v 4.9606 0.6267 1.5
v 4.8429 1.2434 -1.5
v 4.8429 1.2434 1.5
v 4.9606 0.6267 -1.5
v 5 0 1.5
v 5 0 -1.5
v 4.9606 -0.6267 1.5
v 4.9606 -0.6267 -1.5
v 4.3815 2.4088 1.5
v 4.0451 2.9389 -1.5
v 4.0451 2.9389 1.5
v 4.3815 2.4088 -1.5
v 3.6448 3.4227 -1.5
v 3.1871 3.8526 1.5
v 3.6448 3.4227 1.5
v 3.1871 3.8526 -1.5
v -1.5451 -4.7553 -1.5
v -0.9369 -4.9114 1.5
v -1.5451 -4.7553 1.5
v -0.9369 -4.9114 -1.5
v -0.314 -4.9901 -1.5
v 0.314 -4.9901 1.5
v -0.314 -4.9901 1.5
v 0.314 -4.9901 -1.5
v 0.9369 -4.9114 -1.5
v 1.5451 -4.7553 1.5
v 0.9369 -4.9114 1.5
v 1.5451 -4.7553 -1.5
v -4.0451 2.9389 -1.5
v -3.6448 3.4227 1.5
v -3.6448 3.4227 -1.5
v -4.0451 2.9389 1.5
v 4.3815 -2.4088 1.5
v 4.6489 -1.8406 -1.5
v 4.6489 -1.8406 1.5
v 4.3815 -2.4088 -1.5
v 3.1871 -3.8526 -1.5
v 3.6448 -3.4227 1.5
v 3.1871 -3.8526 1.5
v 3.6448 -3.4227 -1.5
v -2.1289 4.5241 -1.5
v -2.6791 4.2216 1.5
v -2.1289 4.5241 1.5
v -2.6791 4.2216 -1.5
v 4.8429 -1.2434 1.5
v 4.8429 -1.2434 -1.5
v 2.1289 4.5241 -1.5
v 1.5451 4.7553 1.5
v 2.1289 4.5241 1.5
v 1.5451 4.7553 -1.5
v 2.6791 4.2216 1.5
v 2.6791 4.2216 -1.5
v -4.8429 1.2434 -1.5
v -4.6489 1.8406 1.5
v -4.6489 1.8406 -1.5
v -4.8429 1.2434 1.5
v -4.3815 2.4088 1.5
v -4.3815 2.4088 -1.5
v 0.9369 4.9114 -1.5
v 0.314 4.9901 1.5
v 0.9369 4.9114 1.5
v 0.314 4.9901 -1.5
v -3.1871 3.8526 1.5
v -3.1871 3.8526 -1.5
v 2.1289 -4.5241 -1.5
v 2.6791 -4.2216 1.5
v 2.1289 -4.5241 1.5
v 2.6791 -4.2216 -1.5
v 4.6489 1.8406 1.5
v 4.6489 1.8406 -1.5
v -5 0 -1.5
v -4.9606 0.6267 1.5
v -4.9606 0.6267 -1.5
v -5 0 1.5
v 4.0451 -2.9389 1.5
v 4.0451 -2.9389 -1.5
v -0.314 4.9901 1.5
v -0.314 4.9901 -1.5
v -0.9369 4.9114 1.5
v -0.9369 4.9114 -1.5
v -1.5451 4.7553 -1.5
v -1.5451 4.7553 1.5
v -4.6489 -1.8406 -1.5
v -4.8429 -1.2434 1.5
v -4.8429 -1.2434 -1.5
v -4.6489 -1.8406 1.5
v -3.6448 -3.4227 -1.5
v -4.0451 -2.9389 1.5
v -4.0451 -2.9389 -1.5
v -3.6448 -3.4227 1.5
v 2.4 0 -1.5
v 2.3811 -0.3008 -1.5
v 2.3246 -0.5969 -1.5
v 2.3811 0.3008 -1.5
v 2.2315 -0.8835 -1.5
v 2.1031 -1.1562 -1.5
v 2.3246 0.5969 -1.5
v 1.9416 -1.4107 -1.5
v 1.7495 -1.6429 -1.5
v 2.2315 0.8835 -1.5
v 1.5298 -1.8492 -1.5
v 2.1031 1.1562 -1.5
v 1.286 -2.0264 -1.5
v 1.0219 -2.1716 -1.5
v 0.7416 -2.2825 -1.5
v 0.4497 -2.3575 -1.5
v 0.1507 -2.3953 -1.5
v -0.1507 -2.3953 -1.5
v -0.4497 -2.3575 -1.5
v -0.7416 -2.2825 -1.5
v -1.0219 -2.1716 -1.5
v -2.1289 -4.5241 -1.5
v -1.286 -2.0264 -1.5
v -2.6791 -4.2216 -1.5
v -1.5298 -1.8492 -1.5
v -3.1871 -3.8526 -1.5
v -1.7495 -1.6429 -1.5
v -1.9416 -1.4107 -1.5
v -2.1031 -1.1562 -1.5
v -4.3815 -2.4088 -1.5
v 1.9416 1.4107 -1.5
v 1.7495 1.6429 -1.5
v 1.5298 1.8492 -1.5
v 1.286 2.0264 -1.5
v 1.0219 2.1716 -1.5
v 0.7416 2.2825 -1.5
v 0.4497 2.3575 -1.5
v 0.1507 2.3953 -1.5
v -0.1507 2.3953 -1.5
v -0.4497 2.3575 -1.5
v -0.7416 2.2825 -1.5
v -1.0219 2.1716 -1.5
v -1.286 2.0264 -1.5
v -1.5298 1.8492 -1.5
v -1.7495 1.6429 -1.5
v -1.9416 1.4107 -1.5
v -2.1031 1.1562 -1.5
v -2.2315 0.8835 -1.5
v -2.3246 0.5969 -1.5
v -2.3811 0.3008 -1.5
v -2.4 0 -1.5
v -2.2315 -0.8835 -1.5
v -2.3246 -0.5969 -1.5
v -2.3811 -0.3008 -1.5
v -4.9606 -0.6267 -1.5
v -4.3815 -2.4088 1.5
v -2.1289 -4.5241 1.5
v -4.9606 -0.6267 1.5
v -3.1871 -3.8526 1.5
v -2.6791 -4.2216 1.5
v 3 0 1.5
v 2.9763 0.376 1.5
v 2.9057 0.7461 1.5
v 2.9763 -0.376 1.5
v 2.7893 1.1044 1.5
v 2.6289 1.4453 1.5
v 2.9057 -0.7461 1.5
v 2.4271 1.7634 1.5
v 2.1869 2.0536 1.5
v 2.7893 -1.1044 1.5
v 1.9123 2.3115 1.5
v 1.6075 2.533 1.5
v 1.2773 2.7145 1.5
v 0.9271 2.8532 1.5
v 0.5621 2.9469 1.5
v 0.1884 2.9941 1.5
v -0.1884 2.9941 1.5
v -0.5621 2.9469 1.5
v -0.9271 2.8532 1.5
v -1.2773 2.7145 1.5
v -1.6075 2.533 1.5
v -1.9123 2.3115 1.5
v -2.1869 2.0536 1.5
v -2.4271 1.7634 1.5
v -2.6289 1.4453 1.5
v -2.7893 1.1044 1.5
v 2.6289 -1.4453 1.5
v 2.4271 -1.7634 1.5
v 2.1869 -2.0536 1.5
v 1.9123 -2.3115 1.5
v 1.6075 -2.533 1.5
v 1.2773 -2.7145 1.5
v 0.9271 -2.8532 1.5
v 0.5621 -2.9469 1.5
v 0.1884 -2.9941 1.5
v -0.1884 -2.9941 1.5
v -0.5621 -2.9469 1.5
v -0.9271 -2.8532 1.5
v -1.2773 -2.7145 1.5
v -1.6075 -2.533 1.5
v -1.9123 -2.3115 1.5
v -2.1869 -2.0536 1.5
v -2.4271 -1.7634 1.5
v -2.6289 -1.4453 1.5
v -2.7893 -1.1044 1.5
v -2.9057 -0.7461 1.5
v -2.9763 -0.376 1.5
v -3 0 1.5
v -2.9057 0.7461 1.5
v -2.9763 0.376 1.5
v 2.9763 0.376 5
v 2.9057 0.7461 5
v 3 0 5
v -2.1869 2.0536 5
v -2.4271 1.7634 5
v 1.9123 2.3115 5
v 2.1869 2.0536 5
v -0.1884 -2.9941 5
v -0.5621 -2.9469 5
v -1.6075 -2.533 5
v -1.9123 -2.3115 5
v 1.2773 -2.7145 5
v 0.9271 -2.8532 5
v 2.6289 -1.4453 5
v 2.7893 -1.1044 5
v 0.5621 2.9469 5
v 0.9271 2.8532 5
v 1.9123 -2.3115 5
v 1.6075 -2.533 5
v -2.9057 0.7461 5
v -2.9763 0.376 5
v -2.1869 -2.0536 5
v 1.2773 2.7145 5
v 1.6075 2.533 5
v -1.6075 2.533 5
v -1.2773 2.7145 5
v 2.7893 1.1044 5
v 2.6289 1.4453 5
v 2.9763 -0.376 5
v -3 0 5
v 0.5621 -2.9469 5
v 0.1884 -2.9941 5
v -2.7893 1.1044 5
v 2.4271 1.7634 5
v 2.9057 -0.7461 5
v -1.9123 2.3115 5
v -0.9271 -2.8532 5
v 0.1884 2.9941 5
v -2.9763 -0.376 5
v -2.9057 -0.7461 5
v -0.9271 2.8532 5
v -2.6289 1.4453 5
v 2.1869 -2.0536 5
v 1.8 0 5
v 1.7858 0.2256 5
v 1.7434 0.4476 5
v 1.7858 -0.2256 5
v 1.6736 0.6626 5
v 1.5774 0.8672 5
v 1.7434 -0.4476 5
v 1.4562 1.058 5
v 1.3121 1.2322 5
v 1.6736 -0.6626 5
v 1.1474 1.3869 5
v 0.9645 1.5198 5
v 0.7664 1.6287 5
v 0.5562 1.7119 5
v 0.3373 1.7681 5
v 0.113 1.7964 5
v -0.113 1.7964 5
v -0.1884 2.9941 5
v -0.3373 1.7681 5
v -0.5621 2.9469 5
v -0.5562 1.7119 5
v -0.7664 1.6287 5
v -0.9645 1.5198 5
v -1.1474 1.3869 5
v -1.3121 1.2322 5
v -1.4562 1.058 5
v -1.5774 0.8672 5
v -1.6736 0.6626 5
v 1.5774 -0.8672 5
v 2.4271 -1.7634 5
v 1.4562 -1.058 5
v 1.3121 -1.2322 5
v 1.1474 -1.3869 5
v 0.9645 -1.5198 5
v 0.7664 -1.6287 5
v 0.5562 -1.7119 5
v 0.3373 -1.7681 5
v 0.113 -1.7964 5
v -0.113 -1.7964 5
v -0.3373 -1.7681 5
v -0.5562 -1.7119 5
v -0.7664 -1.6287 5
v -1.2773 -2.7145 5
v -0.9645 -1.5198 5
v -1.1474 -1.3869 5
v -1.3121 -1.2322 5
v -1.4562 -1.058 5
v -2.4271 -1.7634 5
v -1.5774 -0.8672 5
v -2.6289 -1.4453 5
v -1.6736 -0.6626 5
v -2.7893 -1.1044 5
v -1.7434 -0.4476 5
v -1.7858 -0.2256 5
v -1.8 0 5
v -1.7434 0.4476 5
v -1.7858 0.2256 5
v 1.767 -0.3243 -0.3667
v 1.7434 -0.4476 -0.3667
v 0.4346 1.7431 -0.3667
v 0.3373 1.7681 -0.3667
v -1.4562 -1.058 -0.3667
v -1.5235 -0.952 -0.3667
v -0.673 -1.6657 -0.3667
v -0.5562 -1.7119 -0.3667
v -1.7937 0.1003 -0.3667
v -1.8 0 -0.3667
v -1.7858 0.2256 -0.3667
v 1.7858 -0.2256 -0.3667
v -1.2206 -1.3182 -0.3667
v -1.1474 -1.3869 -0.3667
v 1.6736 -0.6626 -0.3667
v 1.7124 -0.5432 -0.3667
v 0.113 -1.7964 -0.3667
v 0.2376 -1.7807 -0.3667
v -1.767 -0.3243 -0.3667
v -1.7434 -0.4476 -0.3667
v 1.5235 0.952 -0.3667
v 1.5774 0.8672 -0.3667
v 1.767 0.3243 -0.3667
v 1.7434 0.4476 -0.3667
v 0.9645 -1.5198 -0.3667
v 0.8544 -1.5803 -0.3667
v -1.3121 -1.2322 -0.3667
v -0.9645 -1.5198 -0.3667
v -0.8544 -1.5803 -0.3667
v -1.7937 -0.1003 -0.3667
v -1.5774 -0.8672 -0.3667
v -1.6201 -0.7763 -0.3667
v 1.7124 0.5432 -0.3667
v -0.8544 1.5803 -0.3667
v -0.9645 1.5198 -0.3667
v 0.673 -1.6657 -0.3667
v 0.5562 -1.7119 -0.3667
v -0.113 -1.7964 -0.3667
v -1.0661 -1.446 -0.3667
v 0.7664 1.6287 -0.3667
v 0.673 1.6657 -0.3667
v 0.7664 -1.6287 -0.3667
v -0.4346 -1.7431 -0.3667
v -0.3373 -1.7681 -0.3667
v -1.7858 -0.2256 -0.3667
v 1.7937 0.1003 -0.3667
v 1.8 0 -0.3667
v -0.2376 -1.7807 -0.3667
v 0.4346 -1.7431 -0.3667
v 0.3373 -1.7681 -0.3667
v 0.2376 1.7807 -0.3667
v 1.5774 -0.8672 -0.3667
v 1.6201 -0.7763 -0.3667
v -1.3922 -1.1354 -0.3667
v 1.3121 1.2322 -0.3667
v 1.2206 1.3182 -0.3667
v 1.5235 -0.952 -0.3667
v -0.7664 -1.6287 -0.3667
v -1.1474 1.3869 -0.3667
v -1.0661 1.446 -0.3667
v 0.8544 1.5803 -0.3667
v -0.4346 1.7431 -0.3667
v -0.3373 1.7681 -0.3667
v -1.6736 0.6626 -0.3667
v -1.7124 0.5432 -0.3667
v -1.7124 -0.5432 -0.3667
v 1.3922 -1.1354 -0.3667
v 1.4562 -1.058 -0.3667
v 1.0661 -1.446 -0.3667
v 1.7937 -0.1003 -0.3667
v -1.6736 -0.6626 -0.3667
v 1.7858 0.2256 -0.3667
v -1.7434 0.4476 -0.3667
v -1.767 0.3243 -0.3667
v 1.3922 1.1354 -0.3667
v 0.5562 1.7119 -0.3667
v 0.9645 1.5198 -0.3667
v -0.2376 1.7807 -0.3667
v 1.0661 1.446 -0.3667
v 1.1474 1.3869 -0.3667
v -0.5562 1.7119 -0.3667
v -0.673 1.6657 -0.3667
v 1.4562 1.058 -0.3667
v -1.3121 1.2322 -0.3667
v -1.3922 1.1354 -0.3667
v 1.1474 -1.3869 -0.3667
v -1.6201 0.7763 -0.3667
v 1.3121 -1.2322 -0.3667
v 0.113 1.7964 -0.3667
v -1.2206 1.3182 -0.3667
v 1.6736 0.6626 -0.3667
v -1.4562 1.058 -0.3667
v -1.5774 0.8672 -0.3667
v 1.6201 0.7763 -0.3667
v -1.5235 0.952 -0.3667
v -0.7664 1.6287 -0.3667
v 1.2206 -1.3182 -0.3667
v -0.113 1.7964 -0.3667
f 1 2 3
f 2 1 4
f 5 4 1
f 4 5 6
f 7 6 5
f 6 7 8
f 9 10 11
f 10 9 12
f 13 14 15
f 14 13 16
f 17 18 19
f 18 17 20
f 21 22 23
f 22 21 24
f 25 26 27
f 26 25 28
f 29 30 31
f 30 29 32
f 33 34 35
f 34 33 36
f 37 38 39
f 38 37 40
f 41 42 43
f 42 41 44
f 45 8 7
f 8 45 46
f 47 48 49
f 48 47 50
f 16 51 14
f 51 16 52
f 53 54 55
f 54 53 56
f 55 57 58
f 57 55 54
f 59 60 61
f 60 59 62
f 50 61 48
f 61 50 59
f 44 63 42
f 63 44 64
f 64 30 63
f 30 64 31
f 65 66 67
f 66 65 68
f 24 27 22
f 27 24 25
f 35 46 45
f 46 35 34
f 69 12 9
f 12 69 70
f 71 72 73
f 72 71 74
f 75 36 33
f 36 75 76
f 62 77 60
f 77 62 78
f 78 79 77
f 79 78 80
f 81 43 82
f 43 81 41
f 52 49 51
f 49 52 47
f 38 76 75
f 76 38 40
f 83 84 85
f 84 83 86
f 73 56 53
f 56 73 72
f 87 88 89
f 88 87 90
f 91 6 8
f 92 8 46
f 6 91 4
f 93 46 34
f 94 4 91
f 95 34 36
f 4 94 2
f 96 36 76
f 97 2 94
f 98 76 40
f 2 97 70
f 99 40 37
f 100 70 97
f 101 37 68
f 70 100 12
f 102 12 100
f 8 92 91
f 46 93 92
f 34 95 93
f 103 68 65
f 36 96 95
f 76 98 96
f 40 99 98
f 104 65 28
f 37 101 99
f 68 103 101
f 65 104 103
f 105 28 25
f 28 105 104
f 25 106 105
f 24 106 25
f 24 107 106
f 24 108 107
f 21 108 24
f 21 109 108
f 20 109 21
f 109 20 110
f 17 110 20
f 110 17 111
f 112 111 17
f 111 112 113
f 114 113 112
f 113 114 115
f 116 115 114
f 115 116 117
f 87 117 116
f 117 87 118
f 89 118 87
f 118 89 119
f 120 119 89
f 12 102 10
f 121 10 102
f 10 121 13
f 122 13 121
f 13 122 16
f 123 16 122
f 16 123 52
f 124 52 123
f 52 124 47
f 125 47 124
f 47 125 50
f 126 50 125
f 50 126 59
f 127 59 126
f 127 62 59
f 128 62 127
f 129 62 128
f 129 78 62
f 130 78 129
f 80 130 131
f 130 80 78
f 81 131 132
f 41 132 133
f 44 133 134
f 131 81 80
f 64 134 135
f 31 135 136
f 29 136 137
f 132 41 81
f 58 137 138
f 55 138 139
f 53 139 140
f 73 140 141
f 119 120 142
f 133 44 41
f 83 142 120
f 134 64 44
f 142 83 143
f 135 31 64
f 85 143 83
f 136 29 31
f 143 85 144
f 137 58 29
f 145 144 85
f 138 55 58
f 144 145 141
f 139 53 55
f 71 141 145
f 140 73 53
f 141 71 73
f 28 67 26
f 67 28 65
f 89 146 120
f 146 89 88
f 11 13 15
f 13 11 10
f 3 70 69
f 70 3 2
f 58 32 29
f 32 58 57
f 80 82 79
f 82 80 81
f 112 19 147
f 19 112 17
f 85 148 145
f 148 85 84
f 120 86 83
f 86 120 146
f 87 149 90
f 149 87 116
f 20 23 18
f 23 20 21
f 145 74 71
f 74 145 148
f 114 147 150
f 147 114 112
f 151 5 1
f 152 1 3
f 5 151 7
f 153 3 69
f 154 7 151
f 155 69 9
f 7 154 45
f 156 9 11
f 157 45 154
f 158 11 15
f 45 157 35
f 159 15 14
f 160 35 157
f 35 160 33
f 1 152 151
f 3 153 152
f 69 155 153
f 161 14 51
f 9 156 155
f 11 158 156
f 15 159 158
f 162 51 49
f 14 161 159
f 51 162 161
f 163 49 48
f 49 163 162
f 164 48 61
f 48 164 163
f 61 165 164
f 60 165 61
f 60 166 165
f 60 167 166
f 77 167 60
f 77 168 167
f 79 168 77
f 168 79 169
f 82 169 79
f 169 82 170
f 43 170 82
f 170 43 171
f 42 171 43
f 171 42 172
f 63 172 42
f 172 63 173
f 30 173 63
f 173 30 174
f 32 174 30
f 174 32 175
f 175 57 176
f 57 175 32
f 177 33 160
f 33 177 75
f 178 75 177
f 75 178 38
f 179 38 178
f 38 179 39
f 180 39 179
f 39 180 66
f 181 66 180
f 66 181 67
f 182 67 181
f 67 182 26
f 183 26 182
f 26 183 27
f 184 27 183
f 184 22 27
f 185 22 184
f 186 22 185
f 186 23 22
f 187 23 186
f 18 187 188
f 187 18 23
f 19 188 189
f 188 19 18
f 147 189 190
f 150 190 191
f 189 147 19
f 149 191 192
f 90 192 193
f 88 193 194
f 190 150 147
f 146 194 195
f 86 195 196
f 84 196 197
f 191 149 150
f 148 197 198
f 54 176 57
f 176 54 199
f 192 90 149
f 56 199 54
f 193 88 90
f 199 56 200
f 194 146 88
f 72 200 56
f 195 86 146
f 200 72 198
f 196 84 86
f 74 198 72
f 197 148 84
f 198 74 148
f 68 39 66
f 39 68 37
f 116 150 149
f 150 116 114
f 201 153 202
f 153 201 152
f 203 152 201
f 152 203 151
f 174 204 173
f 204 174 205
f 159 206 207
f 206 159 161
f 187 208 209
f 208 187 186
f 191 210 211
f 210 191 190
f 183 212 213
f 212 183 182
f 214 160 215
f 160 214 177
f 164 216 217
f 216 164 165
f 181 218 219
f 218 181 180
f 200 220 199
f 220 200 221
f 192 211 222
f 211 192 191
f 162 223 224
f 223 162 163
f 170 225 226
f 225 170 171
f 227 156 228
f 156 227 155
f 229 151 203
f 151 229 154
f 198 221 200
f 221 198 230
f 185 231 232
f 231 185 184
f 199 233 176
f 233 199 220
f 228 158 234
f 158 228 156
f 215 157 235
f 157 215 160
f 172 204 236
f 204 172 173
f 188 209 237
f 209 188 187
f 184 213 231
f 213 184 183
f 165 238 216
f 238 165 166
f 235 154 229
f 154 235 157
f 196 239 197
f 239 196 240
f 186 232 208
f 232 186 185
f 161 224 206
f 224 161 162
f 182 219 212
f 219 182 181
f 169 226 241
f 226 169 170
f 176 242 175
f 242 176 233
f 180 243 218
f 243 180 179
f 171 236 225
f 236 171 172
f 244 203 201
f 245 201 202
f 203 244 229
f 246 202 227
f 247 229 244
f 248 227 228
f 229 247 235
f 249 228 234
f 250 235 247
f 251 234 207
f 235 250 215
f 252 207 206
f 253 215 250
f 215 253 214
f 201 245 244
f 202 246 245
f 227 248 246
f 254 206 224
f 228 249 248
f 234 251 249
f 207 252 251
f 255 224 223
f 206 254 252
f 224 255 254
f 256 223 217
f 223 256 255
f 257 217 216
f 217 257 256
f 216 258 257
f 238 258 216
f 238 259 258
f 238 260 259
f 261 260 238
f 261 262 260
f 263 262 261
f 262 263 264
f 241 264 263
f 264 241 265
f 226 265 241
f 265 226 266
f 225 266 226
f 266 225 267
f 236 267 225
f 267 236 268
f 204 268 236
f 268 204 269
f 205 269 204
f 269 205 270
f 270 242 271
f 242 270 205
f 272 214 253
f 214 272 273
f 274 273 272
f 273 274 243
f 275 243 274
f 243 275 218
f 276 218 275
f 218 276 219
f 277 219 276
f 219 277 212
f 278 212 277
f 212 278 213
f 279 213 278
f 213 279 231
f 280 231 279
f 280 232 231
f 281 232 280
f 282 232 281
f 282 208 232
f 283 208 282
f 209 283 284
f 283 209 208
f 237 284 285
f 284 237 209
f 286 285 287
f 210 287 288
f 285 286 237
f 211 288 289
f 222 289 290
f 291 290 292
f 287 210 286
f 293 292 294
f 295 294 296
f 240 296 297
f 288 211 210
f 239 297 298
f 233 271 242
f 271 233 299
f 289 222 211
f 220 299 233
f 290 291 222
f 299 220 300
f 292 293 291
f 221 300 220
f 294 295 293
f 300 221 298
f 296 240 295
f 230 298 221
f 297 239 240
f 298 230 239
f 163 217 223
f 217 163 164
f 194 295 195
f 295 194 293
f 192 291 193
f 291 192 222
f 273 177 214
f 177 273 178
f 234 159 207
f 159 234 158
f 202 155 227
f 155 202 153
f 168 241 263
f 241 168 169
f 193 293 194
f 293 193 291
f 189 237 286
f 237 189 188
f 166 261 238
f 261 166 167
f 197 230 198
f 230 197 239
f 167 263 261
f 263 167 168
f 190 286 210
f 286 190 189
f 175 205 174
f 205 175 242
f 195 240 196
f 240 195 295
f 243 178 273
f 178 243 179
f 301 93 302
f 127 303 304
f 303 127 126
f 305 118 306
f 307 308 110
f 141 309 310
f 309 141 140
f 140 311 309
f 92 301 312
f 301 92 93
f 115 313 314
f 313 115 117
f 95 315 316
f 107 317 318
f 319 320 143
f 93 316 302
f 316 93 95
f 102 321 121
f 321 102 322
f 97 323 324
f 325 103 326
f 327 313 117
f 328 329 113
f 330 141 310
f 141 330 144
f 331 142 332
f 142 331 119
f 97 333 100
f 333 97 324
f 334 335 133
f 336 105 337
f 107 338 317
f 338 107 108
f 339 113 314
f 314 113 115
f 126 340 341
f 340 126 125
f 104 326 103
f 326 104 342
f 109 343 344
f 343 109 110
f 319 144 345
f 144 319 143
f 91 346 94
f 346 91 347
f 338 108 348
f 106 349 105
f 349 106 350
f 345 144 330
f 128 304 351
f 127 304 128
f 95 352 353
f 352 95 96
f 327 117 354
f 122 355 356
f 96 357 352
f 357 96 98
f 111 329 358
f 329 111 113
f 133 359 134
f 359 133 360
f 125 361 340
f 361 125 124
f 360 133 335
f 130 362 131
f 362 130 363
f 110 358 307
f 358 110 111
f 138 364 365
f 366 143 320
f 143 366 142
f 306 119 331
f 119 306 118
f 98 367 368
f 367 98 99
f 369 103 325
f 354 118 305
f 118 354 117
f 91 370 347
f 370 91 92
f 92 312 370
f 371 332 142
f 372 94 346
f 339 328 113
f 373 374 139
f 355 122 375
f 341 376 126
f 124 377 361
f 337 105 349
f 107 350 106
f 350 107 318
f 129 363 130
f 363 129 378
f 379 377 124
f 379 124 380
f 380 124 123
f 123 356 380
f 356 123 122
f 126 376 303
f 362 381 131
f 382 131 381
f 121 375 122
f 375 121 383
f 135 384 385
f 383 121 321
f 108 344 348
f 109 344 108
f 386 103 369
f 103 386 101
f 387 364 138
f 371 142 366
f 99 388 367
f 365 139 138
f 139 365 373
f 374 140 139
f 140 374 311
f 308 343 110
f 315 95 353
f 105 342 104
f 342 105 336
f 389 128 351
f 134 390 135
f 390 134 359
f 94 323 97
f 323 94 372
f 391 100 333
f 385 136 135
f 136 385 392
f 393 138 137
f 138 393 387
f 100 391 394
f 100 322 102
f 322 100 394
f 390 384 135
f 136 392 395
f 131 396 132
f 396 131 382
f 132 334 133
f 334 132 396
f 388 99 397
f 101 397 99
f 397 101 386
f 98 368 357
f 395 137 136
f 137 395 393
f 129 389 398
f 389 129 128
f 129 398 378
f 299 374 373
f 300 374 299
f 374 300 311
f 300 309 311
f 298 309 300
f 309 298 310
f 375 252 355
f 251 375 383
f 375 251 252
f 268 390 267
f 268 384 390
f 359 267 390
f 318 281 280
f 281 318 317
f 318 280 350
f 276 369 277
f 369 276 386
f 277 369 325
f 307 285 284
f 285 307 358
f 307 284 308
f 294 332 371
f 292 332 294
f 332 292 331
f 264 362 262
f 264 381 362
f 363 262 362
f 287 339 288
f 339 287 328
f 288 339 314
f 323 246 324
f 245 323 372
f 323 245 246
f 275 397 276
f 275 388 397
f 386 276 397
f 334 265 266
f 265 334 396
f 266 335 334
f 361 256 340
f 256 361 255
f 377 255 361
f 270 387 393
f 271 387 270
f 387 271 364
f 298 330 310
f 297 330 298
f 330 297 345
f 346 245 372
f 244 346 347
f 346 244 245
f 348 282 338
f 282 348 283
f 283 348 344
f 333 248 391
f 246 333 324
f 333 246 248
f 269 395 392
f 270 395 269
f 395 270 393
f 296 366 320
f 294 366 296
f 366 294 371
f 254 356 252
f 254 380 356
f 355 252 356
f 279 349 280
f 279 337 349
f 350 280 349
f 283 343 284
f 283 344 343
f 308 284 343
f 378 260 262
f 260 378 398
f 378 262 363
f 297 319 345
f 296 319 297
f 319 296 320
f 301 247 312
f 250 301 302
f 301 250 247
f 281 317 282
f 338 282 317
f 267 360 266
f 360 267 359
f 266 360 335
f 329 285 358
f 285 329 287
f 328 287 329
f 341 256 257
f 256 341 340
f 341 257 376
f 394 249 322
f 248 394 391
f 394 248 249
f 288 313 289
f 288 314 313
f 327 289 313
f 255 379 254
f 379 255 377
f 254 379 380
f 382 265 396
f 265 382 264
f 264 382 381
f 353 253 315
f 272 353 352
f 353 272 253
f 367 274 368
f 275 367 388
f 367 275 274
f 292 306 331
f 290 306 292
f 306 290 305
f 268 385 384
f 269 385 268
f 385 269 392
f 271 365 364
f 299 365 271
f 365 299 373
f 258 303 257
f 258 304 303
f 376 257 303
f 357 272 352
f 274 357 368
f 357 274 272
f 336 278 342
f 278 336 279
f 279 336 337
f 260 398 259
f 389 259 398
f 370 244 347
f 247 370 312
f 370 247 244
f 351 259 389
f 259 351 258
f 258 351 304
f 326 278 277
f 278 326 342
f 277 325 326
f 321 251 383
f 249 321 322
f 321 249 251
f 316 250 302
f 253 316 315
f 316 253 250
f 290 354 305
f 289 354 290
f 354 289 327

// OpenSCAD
$fn = 50;


difference() {
	union() {
		translate(v = [0, 0, -1.5000000000]) {
			cylinder(h = 3, r = 5.0000000000);
		}
		translate(v = [0, 0, -1.5000000000]) {
			cylinder(h = 6.5000000000, r = 3.0000000000);
		}
	}
	union() {
		translate(v = [0, 0, -1.5000000000]) {
			rotate(a = [0, 180, 0]) {
				difference() {
					union() {
						translate(v = [0, 0, -1.7000000000]) {
							cylinder(h = 1.7000000000, r1 = 1.5000000000, r2 = 2.4000000000);
						}
						translate(v = [0, 0, -6.5000000000]) {
							cylinder(h = 6.5000000000, r = 1.5000000000);
						}
						translate(v = [0, 0, -6.5000000000]) {
							cylinder(h = 6.5000000000, r = 1.8000000000);
						}
						translate(v = [0, 0, -6.5000000000]) {
							cylinder(h = 6.5000000000, r = 1.5000000000);
						}
					}
					union();
				}
			}
		}
		translate(v = [0, 0, -100.0000000000]) {
			cylinder(h = 200, r = 1.5000000000);
		}
	}
}
